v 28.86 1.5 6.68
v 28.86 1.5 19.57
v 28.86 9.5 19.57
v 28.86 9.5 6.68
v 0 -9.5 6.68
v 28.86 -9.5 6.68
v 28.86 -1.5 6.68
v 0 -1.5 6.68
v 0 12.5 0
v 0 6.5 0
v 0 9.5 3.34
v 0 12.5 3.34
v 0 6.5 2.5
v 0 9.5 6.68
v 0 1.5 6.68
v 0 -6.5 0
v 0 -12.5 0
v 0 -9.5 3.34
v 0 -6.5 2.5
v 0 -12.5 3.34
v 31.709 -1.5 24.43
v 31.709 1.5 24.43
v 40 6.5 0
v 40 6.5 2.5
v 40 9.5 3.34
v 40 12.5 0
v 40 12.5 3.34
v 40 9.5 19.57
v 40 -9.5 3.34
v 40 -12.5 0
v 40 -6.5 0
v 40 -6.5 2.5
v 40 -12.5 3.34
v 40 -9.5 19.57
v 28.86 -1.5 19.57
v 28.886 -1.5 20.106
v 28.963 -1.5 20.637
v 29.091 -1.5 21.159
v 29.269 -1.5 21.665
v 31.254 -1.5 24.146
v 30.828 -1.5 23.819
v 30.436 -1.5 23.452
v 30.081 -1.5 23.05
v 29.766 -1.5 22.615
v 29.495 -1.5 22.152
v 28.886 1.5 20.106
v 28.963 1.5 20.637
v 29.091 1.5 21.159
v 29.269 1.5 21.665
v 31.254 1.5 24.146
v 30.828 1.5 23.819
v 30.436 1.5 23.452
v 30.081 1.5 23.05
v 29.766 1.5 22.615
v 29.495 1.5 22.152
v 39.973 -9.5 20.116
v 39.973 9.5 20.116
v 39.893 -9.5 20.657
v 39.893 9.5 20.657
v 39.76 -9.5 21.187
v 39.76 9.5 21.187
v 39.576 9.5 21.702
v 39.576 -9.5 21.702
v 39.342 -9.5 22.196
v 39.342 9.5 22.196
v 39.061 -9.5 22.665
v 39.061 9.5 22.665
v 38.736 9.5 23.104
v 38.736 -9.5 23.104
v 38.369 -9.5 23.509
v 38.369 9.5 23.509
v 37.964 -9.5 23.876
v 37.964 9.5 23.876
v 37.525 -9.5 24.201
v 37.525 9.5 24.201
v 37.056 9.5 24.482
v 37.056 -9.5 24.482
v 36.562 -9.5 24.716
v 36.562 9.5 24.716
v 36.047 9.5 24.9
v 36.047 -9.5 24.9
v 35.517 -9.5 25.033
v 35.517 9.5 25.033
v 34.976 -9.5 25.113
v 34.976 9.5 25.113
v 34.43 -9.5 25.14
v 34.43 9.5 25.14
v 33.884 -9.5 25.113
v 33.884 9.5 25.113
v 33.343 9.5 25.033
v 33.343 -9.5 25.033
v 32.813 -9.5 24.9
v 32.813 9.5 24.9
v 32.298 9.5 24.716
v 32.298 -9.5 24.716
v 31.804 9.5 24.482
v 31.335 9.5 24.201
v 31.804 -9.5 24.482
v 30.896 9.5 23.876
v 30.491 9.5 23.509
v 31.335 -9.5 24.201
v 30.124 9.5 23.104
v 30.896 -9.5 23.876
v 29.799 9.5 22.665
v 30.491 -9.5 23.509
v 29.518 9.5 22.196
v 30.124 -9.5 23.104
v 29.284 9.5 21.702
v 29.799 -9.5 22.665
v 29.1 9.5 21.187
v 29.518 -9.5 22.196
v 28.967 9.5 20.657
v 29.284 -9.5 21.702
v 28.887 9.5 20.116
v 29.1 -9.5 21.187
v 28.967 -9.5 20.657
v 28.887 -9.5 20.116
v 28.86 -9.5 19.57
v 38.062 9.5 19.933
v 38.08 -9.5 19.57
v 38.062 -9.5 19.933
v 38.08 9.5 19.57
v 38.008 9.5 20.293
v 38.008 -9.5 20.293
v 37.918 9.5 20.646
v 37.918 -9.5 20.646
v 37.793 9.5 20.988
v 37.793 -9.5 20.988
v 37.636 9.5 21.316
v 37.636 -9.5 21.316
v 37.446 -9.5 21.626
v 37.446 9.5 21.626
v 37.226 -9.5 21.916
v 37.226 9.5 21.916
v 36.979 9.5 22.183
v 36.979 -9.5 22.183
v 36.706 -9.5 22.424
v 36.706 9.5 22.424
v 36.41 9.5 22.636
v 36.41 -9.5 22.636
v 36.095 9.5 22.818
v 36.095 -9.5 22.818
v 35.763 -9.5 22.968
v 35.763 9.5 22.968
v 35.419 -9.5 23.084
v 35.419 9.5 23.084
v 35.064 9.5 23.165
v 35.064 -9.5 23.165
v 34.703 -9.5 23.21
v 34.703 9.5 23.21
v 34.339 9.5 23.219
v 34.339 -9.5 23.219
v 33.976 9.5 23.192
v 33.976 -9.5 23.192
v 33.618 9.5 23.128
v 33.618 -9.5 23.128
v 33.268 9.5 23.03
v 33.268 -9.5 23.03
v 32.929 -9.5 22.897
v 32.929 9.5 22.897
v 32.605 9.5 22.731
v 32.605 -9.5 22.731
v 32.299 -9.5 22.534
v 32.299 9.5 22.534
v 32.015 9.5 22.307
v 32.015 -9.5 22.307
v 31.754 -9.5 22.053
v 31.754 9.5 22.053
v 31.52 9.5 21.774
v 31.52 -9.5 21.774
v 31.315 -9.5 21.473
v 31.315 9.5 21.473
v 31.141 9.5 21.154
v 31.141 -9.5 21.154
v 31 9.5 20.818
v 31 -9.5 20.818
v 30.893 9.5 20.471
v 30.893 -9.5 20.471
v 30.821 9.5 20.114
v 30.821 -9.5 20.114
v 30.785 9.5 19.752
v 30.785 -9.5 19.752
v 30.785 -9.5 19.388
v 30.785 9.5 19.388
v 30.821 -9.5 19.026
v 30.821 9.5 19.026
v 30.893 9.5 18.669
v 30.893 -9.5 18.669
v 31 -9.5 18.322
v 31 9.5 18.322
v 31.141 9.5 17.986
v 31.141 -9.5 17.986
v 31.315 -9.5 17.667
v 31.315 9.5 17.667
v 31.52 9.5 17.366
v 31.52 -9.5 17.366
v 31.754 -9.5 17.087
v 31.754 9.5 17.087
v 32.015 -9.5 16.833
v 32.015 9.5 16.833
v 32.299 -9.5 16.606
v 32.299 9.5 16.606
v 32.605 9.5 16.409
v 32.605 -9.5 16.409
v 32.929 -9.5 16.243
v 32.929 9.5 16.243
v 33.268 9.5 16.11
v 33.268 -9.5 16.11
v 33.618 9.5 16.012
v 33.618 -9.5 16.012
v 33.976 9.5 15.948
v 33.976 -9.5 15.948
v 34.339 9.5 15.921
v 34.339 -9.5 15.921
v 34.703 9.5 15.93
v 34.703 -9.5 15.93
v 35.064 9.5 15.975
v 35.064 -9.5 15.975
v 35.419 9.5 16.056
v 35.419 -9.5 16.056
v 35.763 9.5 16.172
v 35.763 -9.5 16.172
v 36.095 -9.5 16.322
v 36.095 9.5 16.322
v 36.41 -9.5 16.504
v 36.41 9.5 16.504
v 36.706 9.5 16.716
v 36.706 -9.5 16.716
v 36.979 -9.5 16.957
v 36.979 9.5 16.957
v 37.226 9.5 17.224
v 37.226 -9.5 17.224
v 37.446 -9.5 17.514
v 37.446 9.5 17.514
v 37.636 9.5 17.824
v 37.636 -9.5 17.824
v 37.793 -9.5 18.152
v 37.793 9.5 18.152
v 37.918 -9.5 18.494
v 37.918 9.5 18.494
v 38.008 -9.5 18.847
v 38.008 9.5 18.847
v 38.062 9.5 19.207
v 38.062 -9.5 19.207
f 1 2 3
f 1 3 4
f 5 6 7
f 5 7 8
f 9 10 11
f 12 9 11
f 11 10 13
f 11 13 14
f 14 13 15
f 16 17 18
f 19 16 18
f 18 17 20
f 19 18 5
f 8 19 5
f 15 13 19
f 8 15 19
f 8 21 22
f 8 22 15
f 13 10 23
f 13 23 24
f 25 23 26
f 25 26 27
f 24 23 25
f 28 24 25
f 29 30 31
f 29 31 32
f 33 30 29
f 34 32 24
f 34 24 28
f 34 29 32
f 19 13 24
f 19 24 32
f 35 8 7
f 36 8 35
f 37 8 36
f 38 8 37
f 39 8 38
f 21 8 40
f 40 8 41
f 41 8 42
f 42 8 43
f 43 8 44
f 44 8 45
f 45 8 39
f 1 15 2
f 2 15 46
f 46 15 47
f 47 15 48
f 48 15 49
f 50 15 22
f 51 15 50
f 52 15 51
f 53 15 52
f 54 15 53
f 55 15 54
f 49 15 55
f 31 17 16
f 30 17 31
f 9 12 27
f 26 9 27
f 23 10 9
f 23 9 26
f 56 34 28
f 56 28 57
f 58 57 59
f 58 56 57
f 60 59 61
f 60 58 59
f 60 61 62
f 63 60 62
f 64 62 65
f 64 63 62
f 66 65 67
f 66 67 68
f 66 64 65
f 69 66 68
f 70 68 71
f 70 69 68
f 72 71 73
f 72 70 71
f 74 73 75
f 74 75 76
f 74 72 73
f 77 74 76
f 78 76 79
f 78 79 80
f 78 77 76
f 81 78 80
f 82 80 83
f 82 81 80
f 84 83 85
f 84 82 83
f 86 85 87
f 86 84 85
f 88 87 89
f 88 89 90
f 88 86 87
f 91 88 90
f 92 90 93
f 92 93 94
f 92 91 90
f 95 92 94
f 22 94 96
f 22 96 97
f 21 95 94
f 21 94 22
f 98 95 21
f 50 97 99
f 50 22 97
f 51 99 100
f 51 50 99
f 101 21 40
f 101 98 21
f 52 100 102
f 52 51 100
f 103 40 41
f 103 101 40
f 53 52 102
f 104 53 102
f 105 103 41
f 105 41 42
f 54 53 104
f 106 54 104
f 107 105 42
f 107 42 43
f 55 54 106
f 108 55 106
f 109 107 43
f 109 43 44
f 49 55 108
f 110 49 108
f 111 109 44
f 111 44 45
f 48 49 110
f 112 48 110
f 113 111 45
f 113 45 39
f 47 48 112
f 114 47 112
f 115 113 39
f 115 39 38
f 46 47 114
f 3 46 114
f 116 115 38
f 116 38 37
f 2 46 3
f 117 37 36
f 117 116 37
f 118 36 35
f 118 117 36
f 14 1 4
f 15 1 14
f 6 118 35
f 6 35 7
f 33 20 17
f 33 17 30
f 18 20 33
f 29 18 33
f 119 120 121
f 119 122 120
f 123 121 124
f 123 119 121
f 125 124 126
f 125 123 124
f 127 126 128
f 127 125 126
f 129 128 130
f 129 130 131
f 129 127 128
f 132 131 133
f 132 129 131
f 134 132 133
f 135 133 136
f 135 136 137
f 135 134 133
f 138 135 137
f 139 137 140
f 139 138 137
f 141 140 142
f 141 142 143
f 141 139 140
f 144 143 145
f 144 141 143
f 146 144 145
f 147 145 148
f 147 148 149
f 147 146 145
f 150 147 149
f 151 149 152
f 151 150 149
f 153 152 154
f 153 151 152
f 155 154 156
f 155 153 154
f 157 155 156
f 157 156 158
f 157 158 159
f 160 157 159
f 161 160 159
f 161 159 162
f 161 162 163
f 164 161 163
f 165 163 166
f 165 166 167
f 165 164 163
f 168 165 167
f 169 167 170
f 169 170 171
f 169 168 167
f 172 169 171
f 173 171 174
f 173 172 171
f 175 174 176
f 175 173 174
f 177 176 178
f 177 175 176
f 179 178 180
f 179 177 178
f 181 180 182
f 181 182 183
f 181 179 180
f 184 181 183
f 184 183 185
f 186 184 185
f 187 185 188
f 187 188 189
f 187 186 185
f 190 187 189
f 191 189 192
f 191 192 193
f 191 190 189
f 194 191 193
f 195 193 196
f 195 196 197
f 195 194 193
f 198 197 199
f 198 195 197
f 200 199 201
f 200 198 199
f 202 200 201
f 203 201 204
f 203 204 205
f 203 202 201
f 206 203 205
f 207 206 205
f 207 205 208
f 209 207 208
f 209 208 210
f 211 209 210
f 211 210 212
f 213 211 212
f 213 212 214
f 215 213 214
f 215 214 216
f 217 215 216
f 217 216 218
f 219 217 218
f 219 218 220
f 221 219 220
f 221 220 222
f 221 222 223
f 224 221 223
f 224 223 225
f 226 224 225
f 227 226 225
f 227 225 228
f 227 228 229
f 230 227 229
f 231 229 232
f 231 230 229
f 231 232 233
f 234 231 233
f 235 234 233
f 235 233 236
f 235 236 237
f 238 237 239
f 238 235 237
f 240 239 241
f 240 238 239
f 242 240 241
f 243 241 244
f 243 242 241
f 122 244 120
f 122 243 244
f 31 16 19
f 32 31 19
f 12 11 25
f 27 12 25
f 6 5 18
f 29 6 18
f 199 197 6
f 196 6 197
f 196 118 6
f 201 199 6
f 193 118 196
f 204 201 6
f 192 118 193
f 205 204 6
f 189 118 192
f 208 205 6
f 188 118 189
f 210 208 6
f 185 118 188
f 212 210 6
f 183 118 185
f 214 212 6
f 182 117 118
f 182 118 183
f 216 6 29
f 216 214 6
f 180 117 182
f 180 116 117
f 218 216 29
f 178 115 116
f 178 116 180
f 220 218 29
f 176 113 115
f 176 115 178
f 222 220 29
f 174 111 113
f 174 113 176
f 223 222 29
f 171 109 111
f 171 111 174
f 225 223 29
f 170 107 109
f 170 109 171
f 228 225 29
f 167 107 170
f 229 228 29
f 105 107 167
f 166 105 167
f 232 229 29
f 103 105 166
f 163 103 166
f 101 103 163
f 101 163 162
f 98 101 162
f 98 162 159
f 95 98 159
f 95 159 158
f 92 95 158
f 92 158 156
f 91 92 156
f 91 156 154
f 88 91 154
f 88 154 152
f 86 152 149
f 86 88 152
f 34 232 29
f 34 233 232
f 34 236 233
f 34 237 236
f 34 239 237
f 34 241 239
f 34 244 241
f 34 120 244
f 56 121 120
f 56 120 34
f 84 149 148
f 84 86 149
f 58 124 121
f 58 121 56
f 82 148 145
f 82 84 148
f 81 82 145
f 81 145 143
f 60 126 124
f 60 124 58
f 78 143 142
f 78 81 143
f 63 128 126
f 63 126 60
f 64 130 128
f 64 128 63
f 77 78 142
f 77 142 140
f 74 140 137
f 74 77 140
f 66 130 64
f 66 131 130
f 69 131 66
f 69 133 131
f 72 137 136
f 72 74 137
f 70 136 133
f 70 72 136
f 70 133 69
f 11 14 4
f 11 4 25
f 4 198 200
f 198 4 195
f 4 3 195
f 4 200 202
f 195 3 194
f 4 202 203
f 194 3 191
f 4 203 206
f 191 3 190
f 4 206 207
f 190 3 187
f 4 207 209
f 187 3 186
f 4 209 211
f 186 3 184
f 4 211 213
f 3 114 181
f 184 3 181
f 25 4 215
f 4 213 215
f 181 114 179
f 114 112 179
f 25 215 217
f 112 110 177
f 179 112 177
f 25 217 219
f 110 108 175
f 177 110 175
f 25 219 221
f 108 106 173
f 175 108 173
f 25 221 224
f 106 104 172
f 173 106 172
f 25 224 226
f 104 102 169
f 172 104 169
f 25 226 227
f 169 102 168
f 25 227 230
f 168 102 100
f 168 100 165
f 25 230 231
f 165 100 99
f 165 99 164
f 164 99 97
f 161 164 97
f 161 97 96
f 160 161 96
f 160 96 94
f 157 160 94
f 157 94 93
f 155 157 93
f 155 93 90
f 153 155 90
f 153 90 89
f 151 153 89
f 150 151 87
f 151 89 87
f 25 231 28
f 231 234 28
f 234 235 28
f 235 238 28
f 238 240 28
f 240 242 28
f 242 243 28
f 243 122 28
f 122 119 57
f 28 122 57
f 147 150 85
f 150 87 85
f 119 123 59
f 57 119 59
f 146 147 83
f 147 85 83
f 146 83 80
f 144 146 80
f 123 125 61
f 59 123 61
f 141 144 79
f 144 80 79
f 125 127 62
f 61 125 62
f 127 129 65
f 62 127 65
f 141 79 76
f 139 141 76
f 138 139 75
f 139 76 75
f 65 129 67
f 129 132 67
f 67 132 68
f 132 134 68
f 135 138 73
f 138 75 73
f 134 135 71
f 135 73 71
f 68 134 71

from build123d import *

# Parameters (mm, degrees)
F0_R     = 3.65
F1_DEPTH = 9.5
F0_W     = 40
F0_H     = 3.34
F2_DEPTH = 12.5
F4_DEPTH = 1.5
F5_W     = 13
F5_H     = 2.5
F6_DEPTH = 40.001


with BuildPart() as f1:
    # F0 (on Front) → F1 (new body, symmetric)
    with BuildSketch(Plane.XZ):
        with BuildLine():
            ThreePointArc((28.86, 19.57), (34.43, 14), (40, 19.57))
            ThreePointArc((40, 19.57), (34.43, 25.14), (28.86, 19.57))
        make_face()
        with Locations((34.43, 19.57)):
            Circle(F0_R, mode=Mode.SUBTRACT)
        with BuildLine():
            Line((40, 3.34), (40, 19.57))
            ThreePointArc((40, 19.57), (34.43, 14), (28.86, 19.57))
            Line((28.86, 19.57), (28.86, 6.68))
            Line((28.86, 6.68), (0, 6.68))
            Line((0, 6.68), (0, 3.34))
            Line((0, 3.34), (40, 3.34))
        make_face()
    extrude(amount=F1_DEPTH, both=True)

    # F0 (on Front) → F2 (join, symmetric)
    with BuildSketch(Plane.XZ):
        with Locations((20, 1.67)):
            Rectangle(F0_W, F0_H)
    extrude(amount=F2_DEPTH, both=True)

    # F3 (on Front) → F4 (join, symmetric)
    with BuildSketch(Plane.XZ):
        with BuildLine():
            ThreePointArc((28.86, 19.57), (29.6248313017, 22.3869582498), (31.7092832247, 24.4303086557))
            Line((31.7092832247, 24.4303086557), (0, 6.68))
            Line((0, 6.68), (28.86, 6.68))
            Line((28.86, 6.68), (28.86, 19.57))
        make_face()
    extrude(amount=F4_DEPTH, both=True)

    # F5 (on face) → F6 (cut, through all)
    with BuildSketch(Plane(origin=(0, 0, 0), x_dir=(0, -1, 0), z_dir=(-1, 0, 0))):
        with Locations((0, 1.25)):
            Rectangle(F5_W, F5_H)
    extrude(amount=-F6_DEPTH, mode=Mode.SUBTRACT)


solid = f1.part
